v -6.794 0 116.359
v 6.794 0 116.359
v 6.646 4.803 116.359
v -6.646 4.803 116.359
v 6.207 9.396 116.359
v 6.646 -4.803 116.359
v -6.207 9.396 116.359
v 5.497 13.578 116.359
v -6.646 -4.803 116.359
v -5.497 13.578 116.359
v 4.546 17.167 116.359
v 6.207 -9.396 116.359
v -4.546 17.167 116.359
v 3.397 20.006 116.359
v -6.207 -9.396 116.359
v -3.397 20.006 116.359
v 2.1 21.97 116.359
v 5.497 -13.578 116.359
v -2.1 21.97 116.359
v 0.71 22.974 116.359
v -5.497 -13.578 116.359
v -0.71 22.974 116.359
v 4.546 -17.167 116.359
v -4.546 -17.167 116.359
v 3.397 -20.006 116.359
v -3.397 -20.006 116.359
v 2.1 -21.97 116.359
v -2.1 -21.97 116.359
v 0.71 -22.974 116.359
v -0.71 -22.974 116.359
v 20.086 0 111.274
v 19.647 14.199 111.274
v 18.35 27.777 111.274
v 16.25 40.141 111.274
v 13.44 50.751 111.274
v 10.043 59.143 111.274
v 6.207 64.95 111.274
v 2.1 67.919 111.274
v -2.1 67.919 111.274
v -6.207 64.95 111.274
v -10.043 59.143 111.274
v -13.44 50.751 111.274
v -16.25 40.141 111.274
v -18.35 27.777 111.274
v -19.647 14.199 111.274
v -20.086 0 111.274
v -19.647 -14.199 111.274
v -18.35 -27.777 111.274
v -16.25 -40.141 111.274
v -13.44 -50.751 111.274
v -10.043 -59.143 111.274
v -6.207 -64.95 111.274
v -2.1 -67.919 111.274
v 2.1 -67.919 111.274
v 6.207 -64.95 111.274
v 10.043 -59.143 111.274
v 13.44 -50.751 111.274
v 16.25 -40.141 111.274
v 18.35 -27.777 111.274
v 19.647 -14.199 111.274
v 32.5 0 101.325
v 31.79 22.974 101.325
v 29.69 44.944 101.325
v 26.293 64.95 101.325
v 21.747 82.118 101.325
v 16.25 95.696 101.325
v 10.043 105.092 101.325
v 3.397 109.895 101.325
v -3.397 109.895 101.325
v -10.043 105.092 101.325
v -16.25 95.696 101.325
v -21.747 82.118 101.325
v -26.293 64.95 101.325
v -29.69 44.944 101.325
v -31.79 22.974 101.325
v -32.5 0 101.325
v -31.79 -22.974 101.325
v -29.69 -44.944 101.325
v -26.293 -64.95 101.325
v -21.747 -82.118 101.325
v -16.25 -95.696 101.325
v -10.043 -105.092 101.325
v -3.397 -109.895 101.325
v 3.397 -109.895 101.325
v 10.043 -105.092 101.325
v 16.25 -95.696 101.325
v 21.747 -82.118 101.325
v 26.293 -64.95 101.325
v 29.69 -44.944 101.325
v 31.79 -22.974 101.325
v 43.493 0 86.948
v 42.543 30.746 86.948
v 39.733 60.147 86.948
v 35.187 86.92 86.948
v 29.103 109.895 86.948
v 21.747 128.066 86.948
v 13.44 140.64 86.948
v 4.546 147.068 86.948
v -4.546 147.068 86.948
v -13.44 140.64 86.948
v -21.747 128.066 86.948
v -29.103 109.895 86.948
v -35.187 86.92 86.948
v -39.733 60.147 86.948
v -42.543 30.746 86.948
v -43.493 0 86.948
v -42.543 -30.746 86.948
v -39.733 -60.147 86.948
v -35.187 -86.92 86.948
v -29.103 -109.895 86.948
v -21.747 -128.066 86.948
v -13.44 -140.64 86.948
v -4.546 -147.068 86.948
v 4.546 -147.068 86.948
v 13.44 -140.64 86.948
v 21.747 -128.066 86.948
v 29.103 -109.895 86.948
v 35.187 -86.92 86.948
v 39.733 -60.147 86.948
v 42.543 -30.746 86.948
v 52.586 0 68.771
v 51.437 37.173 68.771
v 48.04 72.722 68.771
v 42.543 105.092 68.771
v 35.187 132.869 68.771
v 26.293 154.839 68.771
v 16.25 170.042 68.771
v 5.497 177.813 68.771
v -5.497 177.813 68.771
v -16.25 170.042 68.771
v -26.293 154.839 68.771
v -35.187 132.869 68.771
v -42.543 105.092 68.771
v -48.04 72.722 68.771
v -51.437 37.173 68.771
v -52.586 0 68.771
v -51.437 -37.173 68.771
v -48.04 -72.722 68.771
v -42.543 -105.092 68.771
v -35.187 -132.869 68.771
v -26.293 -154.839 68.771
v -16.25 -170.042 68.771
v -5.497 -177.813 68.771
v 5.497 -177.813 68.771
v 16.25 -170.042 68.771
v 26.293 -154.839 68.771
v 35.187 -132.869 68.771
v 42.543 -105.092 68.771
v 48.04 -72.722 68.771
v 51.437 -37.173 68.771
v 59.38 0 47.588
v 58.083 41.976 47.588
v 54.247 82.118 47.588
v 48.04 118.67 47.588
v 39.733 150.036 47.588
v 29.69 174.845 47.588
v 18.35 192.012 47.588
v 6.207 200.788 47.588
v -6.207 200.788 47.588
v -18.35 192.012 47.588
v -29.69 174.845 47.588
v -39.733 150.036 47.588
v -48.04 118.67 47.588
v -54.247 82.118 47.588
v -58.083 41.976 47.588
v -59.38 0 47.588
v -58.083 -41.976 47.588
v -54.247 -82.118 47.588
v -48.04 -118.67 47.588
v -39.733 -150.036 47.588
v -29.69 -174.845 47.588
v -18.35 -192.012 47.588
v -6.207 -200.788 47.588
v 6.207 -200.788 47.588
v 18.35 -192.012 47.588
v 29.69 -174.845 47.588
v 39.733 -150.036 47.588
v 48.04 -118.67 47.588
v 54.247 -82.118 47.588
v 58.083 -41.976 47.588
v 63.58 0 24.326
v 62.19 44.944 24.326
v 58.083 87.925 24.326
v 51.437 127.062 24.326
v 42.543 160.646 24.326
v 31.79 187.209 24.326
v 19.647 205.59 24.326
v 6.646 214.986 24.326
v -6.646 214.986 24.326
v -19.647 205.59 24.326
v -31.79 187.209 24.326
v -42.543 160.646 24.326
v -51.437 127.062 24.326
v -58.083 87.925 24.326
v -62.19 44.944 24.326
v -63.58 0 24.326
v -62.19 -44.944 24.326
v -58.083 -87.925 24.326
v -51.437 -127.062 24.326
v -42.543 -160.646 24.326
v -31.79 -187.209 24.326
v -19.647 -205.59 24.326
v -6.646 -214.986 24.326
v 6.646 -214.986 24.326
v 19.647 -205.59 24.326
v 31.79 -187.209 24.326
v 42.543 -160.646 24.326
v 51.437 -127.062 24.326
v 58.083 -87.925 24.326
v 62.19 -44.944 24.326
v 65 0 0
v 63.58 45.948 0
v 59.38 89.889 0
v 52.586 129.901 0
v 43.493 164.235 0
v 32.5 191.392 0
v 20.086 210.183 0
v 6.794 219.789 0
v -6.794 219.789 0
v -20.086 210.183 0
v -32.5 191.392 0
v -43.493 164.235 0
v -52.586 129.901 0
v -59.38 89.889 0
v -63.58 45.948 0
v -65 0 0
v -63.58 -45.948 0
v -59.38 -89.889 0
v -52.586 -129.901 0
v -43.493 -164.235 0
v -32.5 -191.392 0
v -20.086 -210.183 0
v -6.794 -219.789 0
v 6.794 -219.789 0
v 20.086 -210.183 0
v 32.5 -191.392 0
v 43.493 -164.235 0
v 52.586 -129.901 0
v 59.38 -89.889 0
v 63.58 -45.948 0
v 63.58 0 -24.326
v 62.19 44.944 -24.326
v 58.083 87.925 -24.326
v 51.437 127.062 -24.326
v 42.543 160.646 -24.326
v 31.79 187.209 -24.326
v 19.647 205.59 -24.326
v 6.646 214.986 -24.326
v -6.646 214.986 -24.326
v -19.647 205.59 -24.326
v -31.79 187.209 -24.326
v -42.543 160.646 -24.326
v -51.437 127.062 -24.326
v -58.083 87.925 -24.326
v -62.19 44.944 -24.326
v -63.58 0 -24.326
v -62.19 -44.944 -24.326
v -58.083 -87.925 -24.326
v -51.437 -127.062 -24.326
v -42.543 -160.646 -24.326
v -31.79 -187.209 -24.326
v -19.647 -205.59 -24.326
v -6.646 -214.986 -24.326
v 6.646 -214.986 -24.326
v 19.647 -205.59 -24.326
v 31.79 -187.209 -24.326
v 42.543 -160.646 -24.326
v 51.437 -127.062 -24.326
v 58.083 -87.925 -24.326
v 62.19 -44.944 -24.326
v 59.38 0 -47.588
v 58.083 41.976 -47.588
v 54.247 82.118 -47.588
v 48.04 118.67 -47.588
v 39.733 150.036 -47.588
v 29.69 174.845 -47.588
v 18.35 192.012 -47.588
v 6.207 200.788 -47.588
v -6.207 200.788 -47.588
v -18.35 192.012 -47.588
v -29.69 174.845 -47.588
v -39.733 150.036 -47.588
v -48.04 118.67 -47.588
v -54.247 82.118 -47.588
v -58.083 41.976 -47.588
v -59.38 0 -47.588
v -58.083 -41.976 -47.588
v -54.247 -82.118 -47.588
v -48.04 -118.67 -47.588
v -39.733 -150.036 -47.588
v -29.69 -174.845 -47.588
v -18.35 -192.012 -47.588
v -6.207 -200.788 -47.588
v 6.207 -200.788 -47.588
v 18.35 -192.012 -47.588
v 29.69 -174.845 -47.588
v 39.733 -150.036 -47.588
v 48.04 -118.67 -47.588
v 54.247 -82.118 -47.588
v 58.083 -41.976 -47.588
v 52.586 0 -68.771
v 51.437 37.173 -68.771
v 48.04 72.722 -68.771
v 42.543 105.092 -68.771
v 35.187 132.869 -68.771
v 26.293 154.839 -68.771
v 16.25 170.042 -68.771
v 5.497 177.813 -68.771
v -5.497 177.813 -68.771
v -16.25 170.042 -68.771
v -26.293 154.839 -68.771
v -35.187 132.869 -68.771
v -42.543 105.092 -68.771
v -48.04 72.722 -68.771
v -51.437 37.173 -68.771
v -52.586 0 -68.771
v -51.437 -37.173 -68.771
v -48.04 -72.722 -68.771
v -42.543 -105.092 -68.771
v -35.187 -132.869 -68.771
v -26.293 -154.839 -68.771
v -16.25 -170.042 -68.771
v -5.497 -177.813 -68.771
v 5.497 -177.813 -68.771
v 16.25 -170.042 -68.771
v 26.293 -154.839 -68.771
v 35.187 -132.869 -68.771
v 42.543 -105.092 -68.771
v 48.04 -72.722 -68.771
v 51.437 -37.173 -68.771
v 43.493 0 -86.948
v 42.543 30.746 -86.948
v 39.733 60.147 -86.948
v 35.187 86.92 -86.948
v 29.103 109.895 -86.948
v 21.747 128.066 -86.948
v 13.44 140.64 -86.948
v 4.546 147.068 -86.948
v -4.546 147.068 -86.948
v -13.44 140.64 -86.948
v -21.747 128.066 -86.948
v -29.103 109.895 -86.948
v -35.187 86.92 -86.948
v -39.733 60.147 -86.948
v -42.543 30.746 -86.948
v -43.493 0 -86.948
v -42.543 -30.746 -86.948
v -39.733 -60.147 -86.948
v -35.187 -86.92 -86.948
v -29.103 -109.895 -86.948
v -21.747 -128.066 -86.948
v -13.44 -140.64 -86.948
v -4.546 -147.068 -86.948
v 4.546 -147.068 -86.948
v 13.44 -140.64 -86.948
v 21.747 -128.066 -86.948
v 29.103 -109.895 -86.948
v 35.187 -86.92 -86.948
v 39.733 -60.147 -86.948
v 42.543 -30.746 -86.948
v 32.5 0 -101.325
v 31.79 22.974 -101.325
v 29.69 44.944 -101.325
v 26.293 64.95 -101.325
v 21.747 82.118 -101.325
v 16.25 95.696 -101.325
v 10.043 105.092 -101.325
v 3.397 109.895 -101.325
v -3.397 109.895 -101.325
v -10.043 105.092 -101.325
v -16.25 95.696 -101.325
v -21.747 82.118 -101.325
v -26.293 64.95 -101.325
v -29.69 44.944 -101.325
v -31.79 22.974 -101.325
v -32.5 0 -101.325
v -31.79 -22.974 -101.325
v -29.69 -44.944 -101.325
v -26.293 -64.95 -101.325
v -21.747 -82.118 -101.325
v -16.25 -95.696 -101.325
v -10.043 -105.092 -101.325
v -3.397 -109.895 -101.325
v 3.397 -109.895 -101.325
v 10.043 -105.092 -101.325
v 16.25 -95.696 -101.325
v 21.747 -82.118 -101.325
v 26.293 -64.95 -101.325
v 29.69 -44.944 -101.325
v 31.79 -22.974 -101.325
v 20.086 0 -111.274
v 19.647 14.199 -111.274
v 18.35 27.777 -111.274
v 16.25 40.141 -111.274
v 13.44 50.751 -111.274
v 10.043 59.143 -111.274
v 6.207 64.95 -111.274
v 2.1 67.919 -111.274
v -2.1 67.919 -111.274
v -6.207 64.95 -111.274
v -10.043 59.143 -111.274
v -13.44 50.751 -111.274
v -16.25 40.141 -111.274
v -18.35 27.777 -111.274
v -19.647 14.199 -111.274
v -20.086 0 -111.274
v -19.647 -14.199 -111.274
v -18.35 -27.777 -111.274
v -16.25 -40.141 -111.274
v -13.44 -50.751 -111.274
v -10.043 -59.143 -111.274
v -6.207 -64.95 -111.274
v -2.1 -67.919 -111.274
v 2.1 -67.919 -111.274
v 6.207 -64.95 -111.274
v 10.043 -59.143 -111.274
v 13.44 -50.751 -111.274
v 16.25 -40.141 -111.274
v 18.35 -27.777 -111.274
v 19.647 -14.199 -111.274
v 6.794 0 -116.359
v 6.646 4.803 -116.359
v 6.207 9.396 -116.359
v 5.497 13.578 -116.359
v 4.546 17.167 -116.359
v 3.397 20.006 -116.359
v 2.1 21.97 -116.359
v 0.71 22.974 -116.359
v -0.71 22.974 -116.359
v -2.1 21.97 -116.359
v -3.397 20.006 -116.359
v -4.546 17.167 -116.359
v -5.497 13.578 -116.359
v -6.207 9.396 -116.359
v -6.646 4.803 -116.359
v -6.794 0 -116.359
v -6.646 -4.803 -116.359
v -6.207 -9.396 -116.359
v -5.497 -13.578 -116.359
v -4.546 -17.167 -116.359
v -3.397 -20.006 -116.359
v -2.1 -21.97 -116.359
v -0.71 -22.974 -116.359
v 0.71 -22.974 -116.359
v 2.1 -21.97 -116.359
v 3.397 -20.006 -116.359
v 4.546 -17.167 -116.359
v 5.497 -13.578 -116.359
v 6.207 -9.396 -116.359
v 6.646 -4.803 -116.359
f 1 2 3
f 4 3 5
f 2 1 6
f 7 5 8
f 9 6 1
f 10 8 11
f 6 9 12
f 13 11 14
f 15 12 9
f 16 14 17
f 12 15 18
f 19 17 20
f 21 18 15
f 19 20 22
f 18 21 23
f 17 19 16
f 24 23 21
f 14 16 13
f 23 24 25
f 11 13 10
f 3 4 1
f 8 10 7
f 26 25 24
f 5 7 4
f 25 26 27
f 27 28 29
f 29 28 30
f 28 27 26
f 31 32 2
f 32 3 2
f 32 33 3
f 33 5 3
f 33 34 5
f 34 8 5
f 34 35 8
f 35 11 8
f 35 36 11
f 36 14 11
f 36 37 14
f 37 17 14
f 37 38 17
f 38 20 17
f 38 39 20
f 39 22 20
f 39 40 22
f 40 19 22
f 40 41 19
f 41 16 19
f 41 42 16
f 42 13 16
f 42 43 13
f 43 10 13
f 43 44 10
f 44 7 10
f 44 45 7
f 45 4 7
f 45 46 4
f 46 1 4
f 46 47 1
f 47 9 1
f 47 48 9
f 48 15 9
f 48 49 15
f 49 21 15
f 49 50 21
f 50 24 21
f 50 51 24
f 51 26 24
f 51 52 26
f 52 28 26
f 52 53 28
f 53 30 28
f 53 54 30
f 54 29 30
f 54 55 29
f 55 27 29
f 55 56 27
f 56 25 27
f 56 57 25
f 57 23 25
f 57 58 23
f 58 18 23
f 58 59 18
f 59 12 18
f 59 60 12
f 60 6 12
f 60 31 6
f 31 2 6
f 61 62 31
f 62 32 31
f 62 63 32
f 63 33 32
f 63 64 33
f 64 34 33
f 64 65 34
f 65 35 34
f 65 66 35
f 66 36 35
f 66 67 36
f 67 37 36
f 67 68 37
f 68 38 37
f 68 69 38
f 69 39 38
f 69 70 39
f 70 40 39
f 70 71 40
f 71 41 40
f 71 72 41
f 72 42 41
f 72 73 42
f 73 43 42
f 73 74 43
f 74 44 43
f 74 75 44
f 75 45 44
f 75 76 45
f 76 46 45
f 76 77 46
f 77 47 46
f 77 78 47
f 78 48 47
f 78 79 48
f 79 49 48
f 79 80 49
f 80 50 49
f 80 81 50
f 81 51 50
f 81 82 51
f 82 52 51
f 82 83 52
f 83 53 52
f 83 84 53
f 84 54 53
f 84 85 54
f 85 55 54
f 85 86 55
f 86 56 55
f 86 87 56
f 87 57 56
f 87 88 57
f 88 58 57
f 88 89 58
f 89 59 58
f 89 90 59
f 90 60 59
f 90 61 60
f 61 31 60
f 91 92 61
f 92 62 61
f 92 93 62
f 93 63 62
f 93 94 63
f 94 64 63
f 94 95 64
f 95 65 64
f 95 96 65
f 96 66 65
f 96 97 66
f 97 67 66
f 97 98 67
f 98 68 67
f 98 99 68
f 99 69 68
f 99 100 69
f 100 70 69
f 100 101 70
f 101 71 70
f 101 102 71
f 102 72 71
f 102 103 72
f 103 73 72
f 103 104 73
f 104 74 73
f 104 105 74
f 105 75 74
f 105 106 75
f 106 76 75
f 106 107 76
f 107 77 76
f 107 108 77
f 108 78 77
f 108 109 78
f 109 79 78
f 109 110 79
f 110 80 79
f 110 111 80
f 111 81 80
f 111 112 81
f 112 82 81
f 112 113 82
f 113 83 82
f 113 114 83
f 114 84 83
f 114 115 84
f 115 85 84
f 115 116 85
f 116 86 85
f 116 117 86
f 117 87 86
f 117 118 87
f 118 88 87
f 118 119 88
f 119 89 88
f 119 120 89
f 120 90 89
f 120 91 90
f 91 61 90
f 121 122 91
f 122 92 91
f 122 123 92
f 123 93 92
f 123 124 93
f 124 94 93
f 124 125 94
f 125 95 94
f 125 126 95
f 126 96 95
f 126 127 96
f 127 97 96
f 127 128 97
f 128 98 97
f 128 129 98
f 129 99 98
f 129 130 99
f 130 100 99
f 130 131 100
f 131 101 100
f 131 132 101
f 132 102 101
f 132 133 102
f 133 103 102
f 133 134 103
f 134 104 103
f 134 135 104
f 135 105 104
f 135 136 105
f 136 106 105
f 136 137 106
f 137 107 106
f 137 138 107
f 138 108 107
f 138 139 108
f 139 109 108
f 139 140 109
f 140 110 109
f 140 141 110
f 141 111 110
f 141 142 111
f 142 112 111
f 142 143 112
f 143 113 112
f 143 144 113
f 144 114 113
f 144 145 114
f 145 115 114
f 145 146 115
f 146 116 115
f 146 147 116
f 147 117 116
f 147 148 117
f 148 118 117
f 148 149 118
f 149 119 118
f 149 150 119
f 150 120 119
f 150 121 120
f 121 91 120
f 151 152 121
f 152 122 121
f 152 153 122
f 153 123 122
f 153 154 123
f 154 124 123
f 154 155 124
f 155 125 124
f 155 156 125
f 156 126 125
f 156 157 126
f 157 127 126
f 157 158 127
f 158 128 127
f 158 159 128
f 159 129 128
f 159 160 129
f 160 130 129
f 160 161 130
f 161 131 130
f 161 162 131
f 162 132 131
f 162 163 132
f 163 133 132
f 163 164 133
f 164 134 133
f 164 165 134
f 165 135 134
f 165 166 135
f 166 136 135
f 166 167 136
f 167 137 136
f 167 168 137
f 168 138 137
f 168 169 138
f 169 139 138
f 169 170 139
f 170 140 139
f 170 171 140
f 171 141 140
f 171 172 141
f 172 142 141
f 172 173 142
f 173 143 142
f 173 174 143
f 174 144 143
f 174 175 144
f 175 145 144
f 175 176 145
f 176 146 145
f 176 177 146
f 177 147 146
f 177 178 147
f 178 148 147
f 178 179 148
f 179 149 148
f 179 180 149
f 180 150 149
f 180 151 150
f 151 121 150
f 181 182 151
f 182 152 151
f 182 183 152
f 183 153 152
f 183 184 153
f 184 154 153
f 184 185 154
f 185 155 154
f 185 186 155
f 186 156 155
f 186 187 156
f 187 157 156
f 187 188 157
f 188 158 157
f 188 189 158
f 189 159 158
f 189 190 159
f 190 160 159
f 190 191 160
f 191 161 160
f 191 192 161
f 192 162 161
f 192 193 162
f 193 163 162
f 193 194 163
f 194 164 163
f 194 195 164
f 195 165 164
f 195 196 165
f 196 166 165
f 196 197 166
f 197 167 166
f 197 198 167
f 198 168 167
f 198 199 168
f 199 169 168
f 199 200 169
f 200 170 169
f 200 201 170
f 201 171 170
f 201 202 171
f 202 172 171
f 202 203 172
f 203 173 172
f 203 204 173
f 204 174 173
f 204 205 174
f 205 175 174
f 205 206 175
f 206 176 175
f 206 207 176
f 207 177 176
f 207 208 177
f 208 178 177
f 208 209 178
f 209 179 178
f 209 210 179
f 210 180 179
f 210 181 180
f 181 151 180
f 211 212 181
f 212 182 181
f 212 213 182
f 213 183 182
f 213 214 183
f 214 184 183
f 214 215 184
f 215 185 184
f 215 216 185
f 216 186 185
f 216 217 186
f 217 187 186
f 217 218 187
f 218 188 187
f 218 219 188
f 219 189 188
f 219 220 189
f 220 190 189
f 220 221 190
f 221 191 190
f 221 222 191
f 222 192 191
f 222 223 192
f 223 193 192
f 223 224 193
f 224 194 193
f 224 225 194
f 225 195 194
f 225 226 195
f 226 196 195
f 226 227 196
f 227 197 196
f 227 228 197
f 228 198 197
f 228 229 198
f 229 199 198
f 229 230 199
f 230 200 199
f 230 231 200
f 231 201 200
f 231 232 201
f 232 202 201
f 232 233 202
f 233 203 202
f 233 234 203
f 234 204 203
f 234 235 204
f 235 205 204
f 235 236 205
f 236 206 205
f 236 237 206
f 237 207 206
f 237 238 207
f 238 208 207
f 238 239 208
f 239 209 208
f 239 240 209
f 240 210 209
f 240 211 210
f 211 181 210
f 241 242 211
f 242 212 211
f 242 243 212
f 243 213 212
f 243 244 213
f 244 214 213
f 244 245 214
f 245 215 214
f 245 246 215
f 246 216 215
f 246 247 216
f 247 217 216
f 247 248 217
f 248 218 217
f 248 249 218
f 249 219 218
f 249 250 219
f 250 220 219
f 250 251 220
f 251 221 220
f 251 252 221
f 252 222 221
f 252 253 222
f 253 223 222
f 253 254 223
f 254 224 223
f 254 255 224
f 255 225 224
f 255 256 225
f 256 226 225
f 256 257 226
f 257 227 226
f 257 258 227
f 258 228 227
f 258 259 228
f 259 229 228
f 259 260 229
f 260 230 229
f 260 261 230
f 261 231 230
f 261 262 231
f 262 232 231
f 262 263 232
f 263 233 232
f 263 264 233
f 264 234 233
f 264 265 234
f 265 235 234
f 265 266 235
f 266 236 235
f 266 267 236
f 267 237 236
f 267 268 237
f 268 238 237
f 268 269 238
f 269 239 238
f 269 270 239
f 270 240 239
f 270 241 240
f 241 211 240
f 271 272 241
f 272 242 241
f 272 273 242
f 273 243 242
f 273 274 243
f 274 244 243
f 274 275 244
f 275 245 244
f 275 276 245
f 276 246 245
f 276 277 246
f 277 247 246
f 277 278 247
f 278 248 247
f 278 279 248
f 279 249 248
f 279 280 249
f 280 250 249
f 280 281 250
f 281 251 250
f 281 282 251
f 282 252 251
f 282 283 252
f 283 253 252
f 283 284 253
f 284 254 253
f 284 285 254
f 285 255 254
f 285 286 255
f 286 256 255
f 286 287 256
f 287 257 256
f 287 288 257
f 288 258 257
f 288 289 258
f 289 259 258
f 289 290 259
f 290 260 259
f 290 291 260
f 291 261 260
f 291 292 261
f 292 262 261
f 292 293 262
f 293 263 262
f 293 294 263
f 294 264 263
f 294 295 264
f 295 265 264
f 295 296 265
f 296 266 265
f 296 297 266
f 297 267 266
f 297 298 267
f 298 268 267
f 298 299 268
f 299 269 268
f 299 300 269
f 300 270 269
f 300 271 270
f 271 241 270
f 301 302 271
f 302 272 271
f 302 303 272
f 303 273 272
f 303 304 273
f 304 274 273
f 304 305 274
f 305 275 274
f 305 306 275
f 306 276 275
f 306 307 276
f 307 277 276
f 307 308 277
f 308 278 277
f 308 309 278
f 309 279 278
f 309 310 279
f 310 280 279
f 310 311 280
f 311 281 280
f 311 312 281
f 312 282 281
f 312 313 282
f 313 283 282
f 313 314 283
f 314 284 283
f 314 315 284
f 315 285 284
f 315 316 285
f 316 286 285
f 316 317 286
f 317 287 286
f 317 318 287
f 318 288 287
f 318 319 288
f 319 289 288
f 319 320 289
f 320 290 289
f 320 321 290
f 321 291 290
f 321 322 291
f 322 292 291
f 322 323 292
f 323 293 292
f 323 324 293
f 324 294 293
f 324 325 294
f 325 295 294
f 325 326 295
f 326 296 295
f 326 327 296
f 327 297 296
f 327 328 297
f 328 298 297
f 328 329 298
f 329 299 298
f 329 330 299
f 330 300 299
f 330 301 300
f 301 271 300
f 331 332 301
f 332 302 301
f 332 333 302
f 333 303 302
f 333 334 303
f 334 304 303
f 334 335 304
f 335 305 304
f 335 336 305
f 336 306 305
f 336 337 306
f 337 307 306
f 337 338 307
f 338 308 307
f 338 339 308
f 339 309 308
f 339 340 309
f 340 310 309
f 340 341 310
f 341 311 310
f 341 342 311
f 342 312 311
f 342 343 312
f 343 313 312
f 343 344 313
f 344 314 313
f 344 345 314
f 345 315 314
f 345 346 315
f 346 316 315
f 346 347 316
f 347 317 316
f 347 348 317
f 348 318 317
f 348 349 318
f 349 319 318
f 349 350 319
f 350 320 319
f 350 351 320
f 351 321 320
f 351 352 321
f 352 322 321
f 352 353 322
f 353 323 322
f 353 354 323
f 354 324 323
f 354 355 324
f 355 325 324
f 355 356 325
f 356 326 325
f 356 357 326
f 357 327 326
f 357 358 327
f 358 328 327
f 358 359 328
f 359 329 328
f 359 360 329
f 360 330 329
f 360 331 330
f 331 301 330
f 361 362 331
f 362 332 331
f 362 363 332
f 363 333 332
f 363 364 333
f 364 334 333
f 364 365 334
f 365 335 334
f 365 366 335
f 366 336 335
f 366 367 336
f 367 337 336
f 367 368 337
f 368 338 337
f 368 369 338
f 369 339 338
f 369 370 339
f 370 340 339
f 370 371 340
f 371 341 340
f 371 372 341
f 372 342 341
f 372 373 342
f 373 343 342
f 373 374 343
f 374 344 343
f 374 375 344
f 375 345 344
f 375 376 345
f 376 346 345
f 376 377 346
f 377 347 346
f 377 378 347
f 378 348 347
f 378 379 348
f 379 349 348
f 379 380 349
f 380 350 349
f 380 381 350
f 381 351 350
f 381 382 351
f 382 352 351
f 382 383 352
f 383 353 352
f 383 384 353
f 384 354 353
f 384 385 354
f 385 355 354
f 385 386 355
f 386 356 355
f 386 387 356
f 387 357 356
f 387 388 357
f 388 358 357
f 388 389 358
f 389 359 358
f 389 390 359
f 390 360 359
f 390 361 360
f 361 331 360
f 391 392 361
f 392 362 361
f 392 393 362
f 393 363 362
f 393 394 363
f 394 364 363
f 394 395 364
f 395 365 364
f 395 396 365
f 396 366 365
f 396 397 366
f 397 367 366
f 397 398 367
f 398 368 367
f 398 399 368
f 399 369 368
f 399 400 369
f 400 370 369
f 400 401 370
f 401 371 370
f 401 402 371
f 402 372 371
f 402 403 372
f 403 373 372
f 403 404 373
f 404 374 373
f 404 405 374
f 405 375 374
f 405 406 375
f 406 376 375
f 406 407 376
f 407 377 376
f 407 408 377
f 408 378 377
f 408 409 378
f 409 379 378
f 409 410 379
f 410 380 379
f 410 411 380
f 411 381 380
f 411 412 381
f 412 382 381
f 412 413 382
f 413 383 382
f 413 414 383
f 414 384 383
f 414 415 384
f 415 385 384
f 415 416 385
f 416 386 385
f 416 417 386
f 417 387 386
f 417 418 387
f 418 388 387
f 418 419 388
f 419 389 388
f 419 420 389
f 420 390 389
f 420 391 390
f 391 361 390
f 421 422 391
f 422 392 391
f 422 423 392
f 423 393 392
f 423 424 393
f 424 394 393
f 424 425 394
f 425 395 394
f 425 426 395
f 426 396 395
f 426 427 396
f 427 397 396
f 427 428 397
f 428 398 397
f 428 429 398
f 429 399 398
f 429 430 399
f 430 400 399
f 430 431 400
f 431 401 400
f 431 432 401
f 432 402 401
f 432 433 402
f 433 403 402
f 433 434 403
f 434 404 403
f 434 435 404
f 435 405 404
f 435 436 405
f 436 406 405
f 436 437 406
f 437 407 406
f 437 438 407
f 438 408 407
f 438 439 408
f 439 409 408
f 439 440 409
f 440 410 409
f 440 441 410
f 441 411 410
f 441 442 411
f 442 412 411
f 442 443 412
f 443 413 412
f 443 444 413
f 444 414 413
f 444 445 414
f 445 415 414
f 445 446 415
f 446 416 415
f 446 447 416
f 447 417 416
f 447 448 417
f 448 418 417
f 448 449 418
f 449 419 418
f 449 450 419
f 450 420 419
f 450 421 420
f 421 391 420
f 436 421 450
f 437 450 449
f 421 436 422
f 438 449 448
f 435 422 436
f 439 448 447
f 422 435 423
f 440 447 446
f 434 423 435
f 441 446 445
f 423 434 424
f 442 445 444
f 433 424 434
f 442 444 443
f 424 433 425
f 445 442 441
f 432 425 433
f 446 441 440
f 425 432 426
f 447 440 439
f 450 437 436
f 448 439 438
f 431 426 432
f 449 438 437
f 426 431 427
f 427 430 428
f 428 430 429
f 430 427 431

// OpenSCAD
// Generated by SolidPython 1.0.1 on 2020-07-29 00:46:46


scale(v = [5, 17, 9]) {
	sphere(r = 13);
}
/***********************************************
*********      SolidPython code:      **********
************************************************
 
# import packages: SolidPython
from solid import *
from solid.utils import *
from itertools import chain, combinations, permutations


class Resize:

    def __init__(self, scad_file):
        self.scad_file = scad_file
        #self.scad_file = import_scad(scad_file)
        # cone/cylinder param:
        self.r1 = 0
        self.r2 = 0
        self.h = 0
        # rectangular prism param:
        self.w = 0
        self.l = 0
        # ellipse param:
        self.r = 0

    # import OpenScad code (file name corresponds to shape)


    # classify shape + parameters
    def assign(self, param1, param2, param3):
        if self.scad_file == 'cone.scad':
            self.r1 = param1
            self.r2 = param2
            self.h = param3
        elif self.scad_file == 'cylinder.scad':
            self.r1 = param1
            self.r2 = param2
            self.h = param3
        elif self.scad_file == 'rectangularPrism.scad':
            self.h = param1
            self.l = param2
            self.w = param3
        else:
            self.r = param1
            self.h = param2

    # resize parameters
    def iterate(self):
        x = range(3, 20, 2)
        i = 1
        if self.scad_file == 'cone.scad':
            tempList = list(permutations(x, 2))
            for temp in tempList:
                param1 = temp[0]
                param2 = temp[1]
                filepath = 'produced_scad_files/' + 'cone' + str(param1) + '_' + str(param2) + '_' + '.scad'
                scad_render_to_file(cylinder(h=param1, r1=param2, r2=0), filepath)

        elif self.scad_file == 'cylinder.scad':
            tempList = list(permutations(x, 3))
            for temp in tempList:
                param1 = temp[0]
                param2 = temp[1]
                filepath = 'produced_scad_files/' + 'cylinder' + str(param1) + '_' + str(param2) + '_' + '.scad'
                scad_render_to_file(cylinder(h=param1, r1=param2, r2=param2), filepath)

        elif self.scad_file == 'rectangularPrism.scad':
            tempList = list(permutations(x, 3))
            for temp in tempList:
                param1 = temp[0]
                param2 = temp[1]
                param3 = temp[2]
                filepath = 'produced_scad_files/' + 'rectangularPrism' + str(param1) + '_' + str(param2) + '_' + str(
                    param3) + '.scad'
                scad_render_to_file(cube(size=(param1, param2, param3)), filepath)

        elif self.scad_file == 'ellipse.scad':
            tempList = list(permutations(x, 4))
            for temp in tempList:
                param1 = temp[0]
                param2 = temp[1]
                param3 = temp[2]
                param4 = temp[3]
                filepath = 'produced_scad_files/' + 'ellipse' + str(param1) + '_' + str(param2) + '_' + str(param3) + '_' + str(param4) + '.scad'
                scad_render_to_file(scale([param1, param2, param3])(sphere(r=param4)), filepath)

    def render_to_scadfile(self):
        scad_render_to_file(scad, 'example.scad') 
 
************************************************/
